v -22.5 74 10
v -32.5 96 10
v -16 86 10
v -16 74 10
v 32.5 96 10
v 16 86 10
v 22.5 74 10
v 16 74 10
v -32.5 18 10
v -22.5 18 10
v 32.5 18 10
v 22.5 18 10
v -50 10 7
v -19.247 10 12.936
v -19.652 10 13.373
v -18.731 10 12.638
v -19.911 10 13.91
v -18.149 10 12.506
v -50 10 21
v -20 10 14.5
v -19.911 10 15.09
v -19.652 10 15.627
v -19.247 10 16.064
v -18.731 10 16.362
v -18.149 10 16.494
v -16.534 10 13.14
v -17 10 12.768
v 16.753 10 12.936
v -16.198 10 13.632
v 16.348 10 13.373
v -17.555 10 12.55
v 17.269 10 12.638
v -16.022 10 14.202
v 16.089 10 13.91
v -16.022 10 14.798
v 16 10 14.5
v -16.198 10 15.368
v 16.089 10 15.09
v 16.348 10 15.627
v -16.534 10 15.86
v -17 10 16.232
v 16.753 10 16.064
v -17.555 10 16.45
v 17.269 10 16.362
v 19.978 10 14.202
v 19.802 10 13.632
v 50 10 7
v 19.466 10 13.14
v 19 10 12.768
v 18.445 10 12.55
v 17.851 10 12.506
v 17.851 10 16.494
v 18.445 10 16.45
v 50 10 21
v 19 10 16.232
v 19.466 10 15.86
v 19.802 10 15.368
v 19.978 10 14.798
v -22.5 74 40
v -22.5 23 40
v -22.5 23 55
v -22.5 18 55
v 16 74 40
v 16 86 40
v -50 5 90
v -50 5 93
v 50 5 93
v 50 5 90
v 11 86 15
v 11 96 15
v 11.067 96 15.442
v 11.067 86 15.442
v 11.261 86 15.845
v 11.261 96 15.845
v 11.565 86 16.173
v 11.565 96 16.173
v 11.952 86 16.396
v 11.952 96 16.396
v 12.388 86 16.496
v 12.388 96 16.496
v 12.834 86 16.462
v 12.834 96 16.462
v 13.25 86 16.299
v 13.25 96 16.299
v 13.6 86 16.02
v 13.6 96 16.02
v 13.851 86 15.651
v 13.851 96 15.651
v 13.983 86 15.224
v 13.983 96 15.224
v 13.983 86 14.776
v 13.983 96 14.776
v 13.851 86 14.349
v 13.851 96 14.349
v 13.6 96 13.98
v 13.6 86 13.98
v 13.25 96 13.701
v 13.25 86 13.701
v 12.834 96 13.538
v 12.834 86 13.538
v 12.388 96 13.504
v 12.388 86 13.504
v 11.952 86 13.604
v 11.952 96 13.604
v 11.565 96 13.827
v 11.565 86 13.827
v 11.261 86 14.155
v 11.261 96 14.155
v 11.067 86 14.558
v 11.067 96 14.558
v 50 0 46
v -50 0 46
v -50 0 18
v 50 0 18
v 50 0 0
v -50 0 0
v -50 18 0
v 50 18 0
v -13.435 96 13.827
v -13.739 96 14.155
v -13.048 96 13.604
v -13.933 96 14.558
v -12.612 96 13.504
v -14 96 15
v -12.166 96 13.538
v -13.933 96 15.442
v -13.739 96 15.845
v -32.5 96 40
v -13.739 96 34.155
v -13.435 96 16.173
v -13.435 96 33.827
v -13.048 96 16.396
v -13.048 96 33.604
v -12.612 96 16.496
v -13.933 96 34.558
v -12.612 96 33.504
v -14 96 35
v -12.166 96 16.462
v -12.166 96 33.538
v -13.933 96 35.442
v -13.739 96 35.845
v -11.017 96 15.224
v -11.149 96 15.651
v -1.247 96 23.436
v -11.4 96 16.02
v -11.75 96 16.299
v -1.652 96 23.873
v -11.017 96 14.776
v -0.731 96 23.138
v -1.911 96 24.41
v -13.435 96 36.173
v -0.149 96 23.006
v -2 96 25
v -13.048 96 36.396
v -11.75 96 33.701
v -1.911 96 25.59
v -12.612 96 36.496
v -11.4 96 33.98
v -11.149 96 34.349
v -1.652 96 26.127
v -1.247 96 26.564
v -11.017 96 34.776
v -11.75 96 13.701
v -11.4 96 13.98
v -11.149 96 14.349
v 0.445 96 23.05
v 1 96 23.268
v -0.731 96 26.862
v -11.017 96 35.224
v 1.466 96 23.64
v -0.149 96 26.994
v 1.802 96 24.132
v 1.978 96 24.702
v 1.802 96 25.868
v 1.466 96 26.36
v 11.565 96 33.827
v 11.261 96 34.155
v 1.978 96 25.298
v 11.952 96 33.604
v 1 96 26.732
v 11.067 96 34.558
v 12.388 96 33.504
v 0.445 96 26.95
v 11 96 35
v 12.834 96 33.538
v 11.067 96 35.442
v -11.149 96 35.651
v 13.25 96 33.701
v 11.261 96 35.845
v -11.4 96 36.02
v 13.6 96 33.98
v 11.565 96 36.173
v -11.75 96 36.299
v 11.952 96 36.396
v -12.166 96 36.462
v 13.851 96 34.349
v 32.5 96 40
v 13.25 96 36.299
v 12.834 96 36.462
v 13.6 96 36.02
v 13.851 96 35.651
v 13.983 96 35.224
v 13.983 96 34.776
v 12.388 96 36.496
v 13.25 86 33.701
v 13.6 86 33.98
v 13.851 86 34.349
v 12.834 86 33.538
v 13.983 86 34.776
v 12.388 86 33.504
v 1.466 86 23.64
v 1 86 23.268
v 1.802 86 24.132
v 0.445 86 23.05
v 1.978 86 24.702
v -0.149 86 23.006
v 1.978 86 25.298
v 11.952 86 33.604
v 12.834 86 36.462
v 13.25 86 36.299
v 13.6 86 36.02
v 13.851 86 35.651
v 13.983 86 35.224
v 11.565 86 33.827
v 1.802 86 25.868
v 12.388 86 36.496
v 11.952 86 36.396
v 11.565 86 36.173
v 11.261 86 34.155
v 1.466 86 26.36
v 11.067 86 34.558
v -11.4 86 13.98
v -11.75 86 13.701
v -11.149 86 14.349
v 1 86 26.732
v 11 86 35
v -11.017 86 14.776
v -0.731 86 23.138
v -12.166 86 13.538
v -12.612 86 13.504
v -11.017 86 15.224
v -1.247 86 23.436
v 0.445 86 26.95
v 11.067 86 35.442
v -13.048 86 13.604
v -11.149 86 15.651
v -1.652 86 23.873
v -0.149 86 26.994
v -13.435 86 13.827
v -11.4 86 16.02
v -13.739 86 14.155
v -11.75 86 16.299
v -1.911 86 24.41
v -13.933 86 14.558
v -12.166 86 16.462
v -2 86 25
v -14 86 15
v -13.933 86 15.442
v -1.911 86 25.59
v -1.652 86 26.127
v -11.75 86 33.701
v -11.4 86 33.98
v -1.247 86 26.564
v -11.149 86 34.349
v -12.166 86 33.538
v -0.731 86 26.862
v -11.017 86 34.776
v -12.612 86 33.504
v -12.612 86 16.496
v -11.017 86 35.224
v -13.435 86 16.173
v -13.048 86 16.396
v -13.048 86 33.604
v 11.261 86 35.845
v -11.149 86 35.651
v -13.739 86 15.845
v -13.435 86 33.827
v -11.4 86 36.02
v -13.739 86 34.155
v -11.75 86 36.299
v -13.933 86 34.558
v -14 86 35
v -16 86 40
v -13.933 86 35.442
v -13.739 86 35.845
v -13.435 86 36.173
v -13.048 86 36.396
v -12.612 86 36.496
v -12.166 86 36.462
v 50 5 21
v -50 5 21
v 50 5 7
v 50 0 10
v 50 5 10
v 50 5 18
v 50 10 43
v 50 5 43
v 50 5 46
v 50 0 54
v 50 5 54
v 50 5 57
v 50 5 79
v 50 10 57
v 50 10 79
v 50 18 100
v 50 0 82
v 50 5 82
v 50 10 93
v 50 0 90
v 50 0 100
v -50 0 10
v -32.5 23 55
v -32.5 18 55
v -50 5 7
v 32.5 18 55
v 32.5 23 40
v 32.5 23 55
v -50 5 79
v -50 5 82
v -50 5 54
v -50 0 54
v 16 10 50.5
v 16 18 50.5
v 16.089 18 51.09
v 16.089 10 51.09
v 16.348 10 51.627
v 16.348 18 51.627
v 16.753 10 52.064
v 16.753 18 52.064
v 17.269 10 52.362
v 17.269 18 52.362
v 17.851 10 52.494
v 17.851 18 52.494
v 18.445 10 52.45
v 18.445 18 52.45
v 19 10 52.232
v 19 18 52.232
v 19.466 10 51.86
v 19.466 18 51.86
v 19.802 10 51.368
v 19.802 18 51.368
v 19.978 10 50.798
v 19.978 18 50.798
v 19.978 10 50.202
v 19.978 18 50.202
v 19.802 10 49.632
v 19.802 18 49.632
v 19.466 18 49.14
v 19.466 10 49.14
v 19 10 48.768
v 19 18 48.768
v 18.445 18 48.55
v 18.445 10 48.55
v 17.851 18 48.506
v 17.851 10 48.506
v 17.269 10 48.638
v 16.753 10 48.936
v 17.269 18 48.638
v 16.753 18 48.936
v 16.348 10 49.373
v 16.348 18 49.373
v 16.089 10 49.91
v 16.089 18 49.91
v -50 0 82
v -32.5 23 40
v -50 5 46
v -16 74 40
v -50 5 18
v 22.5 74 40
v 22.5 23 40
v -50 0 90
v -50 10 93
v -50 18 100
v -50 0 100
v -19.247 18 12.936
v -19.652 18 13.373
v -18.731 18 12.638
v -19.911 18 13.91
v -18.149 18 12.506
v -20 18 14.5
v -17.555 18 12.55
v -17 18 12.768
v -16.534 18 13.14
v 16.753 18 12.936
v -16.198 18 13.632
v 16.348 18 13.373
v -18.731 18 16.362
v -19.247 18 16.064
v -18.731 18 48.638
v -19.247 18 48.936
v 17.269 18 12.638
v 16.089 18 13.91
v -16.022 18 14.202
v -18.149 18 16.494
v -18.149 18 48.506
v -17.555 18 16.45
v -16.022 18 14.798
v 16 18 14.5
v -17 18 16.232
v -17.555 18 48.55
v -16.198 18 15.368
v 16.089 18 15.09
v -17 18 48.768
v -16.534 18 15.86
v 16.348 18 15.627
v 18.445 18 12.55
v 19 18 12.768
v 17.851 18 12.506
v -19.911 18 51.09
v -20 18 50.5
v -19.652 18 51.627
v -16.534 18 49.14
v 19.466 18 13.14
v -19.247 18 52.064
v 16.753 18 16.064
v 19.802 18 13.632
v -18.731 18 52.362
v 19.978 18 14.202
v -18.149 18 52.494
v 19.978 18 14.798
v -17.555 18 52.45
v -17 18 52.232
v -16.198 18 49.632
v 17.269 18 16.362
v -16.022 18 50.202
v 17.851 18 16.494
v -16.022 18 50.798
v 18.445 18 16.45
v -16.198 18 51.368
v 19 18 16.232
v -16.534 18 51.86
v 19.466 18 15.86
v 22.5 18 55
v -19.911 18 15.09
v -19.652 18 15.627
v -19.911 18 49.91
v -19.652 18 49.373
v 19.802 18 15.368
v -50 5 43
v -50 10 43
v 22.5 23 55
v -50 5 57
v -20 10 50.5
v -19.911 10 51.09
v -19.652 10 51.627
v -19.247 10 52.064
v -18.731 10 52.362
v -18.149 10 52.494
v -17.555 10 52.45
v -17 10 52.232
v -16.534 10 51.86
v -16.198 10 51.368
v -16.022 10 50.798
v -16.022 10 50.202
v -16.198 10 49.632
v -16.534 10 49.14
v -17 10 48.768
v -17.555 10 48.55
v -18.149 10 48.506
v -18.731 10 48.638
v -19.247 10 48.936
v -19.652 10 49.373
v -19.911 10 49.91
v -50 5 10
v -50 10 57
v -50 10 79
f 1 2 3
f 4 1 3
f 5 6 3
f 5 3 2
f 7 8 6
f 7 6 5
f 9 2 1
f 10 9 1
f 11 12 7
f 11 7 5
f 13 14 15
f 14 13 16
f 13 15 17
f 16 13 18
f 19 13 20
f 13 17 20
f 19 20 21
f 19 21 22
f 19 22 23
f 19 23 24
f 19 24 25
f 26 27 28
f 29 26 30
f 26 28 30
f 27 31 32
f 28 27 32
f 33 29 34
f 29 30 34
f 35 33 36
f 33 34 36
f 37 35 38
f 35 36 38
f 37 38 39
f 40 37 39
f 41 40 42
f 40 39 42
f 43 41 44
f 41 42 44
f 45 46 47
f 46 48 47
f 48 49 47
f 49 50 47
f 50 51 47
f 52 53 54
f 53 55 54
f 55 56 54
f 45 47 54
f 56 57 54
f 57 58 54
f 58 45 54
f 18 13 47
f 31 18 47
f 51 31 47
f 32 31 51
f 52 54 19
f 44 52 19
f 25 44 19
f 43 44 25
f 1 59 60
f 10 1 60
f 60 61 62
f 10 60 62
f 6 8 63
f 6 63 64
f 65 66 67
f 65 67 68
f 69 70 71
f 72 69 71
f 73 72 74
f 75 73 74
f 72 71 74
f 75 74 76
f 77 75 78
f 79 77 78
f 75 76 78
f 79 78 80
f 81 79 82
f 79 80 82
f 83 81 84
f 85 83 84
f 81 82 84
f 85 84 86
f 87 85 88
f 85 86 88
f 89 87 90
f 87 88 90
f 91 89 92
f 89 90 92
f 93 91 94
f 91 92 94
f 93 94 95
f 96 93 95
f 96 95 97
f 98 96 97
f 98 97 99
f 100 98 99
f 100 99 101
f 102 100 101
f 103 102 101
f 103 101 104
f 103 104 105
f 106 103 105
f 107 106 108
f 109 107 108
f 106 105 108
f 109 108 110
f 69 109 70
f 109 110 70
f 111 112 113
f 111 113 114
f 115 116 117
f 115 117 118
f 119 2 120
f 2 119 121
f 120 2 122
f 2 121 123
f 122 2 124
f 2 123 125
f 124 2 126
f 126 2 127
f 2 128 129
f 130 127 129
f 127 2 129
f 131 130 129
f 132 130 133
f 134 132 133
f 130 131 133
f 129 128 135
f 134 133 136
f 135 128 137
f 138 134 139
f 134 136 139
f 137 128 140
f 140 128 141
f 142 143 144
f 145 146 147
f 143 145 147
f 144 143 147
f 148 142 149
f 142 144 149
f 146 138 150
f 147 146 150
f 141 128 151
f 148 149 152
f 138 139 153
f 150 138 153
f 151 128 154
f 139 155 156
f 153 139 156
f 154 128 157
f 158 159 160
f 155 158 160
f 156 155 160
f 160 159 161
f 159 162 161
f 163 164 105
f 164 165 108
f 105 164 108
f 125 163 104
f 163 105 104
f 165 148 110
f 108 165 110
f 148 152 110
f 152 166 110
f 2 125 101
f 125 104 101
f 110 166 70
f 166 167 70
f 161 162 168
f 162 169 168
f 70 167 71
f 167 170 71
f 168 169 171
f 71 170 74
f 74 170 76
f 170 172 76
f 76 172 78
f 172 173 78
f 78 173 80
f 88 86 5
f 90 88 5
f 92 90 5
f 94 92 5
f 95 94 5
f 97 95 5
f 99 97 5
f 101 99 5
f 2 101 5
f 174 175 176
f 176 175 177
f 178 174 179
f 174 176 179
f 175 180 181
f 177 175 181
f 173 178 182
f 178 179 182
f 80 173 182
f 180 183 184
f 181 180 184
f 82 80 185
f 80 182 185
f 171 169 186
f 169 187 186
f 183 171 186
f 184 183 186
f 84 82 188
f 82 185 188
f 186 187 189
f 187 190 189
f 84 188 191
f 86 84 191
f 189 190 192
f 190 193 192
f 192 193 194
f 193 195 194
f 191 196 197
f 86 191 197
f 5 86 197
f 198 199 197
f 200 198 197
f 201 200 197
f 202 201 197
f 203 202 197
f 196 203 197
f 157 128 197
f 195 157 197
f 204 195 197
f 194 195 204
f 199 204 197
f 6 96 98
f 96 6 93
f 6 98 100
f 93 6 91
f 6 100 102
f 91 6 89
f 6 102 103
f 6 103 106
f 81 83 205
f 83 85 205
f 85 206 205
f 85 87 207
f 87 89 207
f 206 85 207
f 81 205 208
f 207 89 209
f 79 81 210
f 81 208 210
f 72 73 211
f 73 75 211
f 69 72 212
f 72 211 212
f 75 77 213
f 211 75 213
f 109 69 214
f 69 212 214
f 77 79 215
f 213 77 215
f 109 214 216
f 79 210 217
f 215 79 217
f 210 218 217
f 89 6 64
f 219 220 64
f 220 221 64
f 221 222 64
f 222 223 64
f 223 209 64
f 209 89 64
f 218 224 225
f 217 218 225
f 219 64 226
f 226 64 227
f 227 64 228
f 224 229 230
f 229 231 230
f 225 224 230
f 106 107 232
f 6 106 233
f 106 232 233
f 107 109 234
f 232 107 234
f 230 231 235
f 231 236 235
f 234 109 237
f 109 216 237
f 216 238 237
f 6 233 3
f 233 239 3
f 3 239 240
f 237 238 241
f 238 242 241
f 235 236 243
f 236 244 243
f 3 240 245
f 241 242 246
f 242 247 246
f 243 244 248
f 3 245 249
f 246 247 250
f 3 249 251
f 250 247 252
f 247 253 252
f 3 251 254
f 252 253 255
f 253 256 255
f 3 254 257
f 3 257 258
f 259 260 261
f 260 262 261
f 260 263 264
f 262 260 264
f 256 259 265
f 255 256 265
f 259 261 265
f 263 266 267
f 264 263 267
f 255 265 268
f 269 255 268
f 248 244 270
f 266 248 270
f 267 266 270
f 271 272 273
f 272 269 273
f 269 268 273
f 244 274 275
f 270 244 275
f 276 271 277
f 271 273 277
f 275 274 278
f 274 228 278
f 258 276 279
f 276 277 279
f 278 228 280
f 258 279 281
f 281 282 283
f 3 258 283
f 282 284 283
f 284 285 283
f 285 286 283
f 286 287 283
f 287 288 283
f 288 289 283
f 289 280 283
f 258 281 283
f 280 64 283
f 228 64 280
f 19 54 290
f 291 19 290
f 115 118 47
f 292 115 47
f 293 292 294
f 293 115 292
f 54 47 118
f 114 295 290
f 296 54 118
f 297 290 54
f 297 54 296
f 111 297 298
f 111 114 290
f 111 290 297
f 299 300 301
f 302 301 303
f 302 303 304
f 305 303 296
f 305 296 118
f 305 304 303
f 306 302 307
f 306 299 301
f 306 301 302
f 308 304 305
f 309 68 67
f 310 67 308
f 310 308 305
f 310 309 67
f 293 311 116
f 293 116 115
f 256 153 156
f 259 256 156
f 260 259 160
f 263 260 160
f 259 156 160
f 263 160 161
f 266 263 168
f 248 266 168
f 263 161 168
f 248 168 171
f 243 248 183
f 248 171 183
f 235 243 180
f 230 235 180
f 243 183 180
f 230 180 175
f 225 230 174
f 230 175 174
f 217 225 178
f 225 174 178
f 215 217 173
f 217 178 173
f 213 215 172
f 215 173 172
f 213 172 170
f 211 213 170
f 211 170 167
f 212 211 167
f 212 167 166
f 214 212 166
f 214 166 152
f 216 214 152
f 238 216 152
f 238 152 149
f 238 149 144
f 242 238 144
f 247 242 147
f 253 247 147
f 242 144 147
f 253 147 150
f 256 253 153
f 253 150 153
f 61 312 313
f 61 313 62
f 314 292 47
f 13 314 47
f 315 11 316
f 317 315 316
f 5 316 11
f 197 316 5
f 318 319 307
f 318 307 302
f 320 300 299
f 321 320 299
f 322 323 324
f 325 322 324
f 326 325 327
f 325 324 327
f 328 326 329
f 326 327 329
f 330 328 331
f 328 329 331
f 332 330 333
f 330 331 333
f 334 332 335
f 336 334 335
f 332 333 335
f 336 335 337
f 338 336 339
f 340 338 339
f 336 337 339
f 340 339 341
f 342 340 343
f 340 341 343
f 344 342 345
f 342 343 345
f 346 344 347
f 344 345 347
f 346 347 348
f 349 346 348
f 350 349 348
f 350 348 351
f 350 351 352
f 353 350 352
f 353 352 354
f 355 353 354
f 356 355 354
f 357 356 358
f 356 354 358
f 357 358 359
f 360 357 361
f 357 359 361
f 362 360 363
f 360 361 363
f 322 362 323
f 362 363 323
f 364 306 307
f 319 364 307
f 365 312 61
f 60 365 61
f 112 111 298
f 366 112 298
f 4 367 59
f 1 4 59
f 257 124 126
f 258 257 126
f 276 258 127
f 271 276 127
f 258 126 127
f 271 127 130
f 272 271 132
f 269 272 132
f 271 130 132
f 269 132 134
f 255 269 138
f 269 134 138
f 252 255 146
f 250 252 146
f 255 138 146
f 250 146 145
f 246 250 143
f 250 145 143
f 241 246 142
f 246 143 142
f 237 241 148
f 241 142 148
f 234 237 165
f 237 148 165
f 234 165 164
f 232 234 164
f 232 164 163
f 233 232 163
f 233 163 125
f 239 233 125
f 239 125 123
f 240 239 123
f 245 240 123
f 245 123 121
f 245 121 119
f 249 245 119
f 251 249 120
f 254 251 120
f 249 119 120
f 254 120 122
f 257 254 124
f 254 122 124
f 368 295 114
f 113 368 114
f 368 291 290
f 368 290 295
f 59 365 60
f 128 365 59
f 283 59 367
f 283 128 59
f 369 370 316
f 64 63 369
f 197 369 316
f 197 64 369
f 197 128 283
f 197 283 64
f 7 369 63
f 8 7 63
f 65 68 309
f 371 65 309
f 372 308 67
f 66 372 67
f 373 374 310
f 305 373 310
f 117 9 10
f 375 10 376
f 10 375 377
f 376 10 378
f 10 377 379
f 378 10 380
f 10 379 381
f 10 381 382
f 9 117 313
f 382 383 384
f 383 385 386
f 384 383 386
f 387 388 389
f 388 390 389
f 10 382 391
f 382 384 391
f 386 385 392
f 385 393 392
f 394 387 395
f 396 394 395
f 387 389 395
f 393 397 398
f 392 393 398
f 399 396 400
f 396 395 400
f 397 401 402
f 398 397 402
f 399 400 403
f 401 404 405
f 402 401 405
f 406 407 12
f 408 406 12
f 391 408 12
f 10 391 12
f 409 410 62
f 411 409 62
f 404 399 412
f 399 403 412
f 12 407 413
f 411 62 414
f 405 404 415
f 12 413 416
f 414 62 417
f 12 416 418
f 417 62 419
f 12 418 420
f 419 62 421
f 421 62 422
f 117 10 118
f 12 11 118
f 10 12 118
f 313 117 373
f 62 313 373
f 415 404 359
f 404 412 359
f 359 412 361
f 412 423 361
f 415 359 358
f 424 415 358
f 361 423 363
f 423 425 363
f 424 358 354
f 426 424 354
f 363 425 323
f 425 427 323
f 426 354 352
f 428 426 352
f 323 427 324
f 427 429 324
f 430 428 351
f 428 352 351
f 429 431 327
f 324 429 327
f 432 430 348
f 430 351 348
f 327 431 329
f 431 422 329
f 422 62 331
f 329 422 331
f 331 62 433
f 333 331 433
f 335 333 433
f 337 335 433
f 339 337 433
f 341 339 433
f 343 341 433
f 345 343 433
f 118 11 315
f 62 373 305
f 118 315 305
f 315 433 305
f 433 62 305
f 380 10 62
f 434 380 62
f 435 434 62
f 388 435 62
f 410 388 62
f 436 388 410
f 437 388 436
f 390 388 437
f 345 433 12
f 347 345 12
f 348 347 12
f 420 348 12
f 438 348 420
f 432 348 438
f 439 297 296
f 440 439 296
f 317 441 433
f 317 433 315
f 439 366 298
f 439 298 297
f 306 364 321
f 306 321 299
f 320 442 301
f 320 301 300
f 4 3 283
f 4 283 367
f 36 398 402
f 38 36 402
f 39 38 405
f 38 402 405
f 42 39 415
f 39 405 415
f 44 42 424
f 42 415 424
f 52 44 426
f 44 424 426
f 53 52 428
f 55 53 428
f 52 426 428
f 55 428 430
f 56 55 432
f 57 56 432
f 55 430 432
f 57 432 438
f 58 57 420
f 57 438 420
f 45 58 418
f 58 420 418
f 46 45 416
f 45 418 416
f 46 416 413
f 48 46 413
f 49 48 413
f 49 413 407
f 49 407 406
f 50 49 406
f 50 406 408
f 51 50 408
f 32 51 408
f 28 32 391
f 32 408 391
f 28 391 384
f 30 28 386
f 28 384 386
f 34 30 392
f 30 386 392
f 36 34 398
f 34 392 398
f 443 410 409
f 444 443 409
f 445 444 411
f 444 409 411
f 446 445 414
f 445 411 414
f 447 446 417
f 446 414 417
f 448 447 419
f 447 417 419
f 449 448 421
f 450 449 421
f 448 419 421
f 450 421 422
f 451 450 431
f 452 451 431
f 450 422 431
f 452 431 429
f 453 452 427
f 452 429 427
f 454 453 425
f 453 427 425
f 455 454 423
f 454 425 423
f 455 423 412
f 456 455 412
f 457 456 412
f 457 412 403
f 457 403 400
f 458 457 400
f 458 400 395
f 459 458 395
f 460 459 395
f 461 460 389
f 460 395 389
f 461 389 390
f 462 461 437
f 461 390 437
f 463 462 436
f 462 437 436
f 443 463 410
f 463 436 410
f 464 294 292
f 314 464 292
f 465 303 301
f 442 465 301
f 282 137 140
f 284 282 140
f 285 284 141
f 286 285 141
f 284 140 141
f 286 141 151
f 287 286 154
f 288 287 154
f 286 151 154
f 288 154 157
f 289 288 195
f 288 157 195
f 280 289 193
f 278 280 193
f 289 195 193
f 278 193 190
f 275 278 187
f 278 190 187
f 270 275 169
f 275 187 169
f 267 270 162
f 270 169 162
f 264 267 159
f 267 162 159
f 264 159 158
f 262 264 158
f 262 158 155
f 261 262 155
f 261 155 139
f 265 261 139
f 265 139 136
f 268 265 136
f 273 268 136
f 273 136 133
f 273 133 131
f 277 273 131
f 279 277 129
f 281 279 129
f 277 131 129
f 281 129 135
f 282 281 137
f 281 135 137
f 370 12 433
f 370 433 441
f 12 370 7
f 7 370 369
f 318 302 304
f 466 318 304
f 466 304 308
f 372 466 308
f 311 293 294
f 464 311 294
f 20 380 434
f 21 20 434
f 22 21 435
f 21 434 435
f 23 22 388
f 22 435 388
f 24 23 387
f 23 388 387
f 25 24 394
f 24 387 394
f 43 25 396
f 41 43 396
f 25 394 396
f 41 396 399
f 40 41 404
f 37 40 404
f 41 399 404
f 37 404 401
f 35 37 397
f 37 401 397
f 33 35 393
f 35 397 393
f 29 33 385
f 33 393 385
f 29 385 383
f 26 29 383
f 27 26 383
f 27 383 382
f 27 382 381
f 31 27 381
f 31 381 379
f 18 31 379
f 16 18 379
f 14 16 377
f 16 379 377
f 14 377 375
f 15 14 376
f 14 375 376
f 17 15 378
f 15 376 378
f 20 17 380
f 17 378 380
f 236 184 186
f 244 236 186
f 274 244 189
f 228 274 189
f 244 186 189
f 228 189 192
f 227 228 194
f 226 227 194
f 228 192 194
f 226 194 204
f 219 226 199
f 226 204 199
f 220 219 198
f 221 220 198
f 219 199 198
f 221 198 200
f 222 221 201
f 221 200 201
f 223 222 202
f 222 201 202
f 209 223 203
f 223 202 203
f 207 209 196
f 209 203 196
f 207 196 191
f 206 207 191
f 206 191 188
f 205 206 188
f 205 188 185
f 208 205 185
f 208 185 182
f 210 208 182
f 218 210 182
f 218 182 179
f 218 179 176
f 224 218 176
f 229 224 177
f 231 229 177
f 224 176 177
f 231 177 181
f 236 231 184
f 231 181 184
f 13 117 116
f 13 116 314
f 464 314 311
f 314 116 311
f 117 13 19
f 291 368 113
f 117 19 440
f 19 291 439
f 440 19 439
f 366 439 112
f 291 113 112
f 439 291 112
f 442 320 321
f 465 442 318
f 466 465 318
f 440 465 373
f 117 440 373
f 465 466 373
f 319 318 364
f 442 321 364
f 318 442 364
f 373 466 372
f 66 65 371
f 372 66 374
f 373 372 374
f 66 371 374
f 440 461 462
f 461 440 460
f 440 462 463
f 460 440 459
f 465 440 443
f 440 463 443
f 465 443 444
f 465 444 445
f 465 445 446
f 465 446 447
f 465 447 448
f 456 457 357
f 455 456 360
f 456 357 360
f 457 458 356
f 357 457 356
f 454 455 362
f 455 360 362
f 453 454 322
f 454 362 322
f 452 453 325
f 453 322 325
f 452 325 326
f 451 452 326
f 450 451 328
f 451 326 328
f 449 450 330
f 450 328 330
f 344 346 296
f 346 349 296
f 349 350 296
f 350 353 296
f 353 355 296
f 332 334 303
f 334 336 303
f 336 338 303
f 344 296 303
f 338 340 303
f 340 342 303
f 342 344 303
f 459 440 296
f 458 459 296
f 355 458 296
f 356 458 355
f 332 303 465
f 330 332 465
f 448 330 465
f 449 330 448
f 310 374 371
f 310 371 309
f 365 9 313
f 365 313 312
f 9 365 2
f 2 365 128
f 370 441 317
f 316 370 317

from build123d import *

# Parameters (mm, degrees)
F0_W      = 100
F0_H      = 100
F1_DEPTH  = 96
F2_W      = 17.5
F2_H      = 78
F3_DEPTH  = 100.001
F4_W      = 65
F4_H      = 78
F5_DEPTH  = 45
F6_W      = 65
F6_H      = 78
F7_DEPTH  = 10
F8_W      = 65
F8_H      = 73
F9_DEPTH  = 15
F11_DEPTH = 100.001
F12_R     = 1.5
F12_R_2   = 2
F13_DEPTH = 10
F14_R     = 2
F15_DEPTH = 8


with BuildPart() as f1:
    # F0 (on Front) → F1 (new body)
    with BuildSketch(Plane.XZ):
        with Locations((0, 50)):
            Rectangle(F0_W, F0_H)
    extrude(amount=-F1_DEPTH)

    # F2 (on face) → F3 (cut, through all)
    with BuildSketch(Plane.XY.offset(100)):
        with Locations((-41.25, 57)):
            Rectangle(F2_W, F2_H)
        with Locations((41.25, 57)):
            Rectangle(F2_W, F2_H)
        Polygon((-22.5, 74), (-22.5, 18), (22.5, 18), (22.5, 74), (16, 74), (16, 86), (-16, 86), (-16, 74), align=None)
    extrude(amount=-F3_DEPTH, mode=Mode.SUBTRACT)

    # F4 (on face) → F5 (cut)
    with BuildSketch(Plane.XY.offset(100)):
        with Locations((0, 57)):
            Rectangle(F4_W, F4_H)
    extrude(amount=-F5_DEPTH, mode=Mode.SUBTRACT)

    # F6 (on face) → F7 (cut)
    with BuildSketch(Plane(origin=(0, 0, 0), x_dir=(1, 0, 0), z_dir=(0, 0, -1))):
        with Locations((0, -57)):
            Rectangle(F6_W, F6_H)
    extrude(amount=-F7_DEPTH, mode=Mode.SUBTRACT)

    # F8 (on face) → F9 (cut)
    with BuildSketch(Plane.XY.offset(55)):
        with Locations((0, 59.5)):
            Rectangle(F8_W, F8_H)
    extrude(amount=-F9_DEPTH, mode=Mode.SUBTRACT)

    # F10 (on face) → F11 (cut, through all)
    with BuildSketch(Plane.YZ.offset(50)):
        Polygon((0, 18), (0, 10), (5, 10), (5, 7), (10, 7), (10, 21), (5, 21), (5, 18), align=None)
        Polygon((5, 46), (5, 43), (10, 43), (10, 57), (5, 57), (5, 54), (0, 54), (0, 46), align=None)
        Polygon((5, 82), (5, 79), (10, 79), (10, 93), (5, 93), (5, 90), (0, 90), (0, 82), align=None)
    extrude(amount=-F11_DEPTH, mode=Mode.SUBTRACT)

    # F12 (on face) → F13 (cut)
    with BuildSketch(Plane(origin=(0, 96, 0), x_dir=(-1, 0, 0), z_dir=(0, 1, 0))):
        with Locations((-12.5, 35)):
            Circle(F12_R)
        with Locations((-12.5, 15)):
            Circle(F12_R)
        with Locations((12.5, 35)):
            Circle(F12_R)
        with Locations((12.5, 15)):
            Circle(F12_R)
        with Locations((0, 25)):
            Circle(F12_R_2)
    extrude(amount=-F13_DEPTH, mode=Mode.SUBTRACT)

    # F14 (on face) → F15 (cut)
    with BuildSketch(Plane(origin=(0, 18, 0), x_dir=(-1, 0, 0), z_dir=(0, 1, 0))):
        with Locations((18, 50.5)):
            Circle(F14_R)
        with Locations((18, 14.5)):
            Circle(F14_R)
        with Locations((-18, 50.5)):
            Circle(F14_R)
        with Locations((-18, 14.5)):
            Circle(F14_R)
    extrude(amount=-F15_DEPTH, mode=Mode.SUBTRACT)


solid = f1.part
